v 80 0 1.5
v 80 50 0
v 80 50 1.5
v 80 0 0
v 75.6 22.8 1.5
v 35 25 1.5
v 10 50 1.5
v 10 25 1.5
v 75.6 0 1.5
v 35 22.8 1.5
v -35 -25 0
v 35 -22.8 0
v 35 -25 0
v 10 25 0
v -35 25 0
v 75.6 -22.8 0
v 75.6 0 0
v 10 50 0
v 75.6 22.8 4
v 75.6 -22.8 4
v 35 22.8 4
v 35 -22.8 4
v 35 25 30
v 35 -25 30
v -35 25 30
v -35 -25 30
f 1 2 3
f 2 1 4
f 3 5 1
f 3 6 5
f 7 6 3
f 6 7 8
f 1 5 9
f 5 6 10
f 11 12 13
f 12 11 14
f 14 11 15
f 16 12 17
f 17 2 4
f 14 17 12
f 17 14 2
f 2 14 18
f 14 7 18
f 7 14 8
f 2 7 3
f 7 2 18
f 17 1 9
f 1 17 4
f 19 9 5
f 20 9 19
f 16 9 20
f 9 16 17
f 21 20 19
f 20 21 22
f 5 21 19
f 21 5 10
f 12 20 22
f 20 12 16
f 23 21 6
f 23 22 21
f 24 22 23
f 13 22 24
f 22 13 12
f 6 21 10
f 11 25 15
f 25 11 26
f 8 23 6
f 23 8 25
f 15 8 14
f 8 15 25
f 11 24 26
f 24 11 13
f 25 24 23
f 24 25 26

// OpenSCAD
// Two-part enclosure for small electronics board
// Print orientation: box upright, lid upside down (lip on top)

// ---- Parameters ----
box_x      = 70;    // box outer length (X)
box_y      = 50;    // box outer width (Y)
box_z      = 30;    // box height (Z)
box_w      = 2;     // box wall thickness
box_floor  = 2;     // box floor thickness
gap        = 10;    // gap between box and lid
lip_t      = 1.5;   // lid lip thickness (wall)
lip_h      = 4;     // lid lip height
eps        = 0.5;   // cutter overshoot

$fn = 64;

// ---- Derived ----
box_id_x = box_x - 2*box_w;   // inner length
box_id_y = box_y - 2*box_w;   // inner width
lip_w    = box_id_x - 0.4;    // lip outer length (0.2 clearance each side)
lip_d    = box_id_y - 0.4;    // lip outer width

// ---- Model ----
union() {
    // Box
    translate([-box_x/2, -box_y/2, 0])
        cube([box_x, box_y, box_floor]);
    translate([-box_x/2, -box_y/2, box_floor])
        cube([box_x, box_y, box_z - box_floor]);

    // Lid (plate + lip), centred on origin, placed on +X side
    translate([gap, 0, 0])
        union() {
            // Plate
            cube([box_x, box_y, lip_t]);
            // Lip
            translate([0, -lip_d/2, 0])
                cube([lip_w, lip_d, lip_h]);
        }
}
